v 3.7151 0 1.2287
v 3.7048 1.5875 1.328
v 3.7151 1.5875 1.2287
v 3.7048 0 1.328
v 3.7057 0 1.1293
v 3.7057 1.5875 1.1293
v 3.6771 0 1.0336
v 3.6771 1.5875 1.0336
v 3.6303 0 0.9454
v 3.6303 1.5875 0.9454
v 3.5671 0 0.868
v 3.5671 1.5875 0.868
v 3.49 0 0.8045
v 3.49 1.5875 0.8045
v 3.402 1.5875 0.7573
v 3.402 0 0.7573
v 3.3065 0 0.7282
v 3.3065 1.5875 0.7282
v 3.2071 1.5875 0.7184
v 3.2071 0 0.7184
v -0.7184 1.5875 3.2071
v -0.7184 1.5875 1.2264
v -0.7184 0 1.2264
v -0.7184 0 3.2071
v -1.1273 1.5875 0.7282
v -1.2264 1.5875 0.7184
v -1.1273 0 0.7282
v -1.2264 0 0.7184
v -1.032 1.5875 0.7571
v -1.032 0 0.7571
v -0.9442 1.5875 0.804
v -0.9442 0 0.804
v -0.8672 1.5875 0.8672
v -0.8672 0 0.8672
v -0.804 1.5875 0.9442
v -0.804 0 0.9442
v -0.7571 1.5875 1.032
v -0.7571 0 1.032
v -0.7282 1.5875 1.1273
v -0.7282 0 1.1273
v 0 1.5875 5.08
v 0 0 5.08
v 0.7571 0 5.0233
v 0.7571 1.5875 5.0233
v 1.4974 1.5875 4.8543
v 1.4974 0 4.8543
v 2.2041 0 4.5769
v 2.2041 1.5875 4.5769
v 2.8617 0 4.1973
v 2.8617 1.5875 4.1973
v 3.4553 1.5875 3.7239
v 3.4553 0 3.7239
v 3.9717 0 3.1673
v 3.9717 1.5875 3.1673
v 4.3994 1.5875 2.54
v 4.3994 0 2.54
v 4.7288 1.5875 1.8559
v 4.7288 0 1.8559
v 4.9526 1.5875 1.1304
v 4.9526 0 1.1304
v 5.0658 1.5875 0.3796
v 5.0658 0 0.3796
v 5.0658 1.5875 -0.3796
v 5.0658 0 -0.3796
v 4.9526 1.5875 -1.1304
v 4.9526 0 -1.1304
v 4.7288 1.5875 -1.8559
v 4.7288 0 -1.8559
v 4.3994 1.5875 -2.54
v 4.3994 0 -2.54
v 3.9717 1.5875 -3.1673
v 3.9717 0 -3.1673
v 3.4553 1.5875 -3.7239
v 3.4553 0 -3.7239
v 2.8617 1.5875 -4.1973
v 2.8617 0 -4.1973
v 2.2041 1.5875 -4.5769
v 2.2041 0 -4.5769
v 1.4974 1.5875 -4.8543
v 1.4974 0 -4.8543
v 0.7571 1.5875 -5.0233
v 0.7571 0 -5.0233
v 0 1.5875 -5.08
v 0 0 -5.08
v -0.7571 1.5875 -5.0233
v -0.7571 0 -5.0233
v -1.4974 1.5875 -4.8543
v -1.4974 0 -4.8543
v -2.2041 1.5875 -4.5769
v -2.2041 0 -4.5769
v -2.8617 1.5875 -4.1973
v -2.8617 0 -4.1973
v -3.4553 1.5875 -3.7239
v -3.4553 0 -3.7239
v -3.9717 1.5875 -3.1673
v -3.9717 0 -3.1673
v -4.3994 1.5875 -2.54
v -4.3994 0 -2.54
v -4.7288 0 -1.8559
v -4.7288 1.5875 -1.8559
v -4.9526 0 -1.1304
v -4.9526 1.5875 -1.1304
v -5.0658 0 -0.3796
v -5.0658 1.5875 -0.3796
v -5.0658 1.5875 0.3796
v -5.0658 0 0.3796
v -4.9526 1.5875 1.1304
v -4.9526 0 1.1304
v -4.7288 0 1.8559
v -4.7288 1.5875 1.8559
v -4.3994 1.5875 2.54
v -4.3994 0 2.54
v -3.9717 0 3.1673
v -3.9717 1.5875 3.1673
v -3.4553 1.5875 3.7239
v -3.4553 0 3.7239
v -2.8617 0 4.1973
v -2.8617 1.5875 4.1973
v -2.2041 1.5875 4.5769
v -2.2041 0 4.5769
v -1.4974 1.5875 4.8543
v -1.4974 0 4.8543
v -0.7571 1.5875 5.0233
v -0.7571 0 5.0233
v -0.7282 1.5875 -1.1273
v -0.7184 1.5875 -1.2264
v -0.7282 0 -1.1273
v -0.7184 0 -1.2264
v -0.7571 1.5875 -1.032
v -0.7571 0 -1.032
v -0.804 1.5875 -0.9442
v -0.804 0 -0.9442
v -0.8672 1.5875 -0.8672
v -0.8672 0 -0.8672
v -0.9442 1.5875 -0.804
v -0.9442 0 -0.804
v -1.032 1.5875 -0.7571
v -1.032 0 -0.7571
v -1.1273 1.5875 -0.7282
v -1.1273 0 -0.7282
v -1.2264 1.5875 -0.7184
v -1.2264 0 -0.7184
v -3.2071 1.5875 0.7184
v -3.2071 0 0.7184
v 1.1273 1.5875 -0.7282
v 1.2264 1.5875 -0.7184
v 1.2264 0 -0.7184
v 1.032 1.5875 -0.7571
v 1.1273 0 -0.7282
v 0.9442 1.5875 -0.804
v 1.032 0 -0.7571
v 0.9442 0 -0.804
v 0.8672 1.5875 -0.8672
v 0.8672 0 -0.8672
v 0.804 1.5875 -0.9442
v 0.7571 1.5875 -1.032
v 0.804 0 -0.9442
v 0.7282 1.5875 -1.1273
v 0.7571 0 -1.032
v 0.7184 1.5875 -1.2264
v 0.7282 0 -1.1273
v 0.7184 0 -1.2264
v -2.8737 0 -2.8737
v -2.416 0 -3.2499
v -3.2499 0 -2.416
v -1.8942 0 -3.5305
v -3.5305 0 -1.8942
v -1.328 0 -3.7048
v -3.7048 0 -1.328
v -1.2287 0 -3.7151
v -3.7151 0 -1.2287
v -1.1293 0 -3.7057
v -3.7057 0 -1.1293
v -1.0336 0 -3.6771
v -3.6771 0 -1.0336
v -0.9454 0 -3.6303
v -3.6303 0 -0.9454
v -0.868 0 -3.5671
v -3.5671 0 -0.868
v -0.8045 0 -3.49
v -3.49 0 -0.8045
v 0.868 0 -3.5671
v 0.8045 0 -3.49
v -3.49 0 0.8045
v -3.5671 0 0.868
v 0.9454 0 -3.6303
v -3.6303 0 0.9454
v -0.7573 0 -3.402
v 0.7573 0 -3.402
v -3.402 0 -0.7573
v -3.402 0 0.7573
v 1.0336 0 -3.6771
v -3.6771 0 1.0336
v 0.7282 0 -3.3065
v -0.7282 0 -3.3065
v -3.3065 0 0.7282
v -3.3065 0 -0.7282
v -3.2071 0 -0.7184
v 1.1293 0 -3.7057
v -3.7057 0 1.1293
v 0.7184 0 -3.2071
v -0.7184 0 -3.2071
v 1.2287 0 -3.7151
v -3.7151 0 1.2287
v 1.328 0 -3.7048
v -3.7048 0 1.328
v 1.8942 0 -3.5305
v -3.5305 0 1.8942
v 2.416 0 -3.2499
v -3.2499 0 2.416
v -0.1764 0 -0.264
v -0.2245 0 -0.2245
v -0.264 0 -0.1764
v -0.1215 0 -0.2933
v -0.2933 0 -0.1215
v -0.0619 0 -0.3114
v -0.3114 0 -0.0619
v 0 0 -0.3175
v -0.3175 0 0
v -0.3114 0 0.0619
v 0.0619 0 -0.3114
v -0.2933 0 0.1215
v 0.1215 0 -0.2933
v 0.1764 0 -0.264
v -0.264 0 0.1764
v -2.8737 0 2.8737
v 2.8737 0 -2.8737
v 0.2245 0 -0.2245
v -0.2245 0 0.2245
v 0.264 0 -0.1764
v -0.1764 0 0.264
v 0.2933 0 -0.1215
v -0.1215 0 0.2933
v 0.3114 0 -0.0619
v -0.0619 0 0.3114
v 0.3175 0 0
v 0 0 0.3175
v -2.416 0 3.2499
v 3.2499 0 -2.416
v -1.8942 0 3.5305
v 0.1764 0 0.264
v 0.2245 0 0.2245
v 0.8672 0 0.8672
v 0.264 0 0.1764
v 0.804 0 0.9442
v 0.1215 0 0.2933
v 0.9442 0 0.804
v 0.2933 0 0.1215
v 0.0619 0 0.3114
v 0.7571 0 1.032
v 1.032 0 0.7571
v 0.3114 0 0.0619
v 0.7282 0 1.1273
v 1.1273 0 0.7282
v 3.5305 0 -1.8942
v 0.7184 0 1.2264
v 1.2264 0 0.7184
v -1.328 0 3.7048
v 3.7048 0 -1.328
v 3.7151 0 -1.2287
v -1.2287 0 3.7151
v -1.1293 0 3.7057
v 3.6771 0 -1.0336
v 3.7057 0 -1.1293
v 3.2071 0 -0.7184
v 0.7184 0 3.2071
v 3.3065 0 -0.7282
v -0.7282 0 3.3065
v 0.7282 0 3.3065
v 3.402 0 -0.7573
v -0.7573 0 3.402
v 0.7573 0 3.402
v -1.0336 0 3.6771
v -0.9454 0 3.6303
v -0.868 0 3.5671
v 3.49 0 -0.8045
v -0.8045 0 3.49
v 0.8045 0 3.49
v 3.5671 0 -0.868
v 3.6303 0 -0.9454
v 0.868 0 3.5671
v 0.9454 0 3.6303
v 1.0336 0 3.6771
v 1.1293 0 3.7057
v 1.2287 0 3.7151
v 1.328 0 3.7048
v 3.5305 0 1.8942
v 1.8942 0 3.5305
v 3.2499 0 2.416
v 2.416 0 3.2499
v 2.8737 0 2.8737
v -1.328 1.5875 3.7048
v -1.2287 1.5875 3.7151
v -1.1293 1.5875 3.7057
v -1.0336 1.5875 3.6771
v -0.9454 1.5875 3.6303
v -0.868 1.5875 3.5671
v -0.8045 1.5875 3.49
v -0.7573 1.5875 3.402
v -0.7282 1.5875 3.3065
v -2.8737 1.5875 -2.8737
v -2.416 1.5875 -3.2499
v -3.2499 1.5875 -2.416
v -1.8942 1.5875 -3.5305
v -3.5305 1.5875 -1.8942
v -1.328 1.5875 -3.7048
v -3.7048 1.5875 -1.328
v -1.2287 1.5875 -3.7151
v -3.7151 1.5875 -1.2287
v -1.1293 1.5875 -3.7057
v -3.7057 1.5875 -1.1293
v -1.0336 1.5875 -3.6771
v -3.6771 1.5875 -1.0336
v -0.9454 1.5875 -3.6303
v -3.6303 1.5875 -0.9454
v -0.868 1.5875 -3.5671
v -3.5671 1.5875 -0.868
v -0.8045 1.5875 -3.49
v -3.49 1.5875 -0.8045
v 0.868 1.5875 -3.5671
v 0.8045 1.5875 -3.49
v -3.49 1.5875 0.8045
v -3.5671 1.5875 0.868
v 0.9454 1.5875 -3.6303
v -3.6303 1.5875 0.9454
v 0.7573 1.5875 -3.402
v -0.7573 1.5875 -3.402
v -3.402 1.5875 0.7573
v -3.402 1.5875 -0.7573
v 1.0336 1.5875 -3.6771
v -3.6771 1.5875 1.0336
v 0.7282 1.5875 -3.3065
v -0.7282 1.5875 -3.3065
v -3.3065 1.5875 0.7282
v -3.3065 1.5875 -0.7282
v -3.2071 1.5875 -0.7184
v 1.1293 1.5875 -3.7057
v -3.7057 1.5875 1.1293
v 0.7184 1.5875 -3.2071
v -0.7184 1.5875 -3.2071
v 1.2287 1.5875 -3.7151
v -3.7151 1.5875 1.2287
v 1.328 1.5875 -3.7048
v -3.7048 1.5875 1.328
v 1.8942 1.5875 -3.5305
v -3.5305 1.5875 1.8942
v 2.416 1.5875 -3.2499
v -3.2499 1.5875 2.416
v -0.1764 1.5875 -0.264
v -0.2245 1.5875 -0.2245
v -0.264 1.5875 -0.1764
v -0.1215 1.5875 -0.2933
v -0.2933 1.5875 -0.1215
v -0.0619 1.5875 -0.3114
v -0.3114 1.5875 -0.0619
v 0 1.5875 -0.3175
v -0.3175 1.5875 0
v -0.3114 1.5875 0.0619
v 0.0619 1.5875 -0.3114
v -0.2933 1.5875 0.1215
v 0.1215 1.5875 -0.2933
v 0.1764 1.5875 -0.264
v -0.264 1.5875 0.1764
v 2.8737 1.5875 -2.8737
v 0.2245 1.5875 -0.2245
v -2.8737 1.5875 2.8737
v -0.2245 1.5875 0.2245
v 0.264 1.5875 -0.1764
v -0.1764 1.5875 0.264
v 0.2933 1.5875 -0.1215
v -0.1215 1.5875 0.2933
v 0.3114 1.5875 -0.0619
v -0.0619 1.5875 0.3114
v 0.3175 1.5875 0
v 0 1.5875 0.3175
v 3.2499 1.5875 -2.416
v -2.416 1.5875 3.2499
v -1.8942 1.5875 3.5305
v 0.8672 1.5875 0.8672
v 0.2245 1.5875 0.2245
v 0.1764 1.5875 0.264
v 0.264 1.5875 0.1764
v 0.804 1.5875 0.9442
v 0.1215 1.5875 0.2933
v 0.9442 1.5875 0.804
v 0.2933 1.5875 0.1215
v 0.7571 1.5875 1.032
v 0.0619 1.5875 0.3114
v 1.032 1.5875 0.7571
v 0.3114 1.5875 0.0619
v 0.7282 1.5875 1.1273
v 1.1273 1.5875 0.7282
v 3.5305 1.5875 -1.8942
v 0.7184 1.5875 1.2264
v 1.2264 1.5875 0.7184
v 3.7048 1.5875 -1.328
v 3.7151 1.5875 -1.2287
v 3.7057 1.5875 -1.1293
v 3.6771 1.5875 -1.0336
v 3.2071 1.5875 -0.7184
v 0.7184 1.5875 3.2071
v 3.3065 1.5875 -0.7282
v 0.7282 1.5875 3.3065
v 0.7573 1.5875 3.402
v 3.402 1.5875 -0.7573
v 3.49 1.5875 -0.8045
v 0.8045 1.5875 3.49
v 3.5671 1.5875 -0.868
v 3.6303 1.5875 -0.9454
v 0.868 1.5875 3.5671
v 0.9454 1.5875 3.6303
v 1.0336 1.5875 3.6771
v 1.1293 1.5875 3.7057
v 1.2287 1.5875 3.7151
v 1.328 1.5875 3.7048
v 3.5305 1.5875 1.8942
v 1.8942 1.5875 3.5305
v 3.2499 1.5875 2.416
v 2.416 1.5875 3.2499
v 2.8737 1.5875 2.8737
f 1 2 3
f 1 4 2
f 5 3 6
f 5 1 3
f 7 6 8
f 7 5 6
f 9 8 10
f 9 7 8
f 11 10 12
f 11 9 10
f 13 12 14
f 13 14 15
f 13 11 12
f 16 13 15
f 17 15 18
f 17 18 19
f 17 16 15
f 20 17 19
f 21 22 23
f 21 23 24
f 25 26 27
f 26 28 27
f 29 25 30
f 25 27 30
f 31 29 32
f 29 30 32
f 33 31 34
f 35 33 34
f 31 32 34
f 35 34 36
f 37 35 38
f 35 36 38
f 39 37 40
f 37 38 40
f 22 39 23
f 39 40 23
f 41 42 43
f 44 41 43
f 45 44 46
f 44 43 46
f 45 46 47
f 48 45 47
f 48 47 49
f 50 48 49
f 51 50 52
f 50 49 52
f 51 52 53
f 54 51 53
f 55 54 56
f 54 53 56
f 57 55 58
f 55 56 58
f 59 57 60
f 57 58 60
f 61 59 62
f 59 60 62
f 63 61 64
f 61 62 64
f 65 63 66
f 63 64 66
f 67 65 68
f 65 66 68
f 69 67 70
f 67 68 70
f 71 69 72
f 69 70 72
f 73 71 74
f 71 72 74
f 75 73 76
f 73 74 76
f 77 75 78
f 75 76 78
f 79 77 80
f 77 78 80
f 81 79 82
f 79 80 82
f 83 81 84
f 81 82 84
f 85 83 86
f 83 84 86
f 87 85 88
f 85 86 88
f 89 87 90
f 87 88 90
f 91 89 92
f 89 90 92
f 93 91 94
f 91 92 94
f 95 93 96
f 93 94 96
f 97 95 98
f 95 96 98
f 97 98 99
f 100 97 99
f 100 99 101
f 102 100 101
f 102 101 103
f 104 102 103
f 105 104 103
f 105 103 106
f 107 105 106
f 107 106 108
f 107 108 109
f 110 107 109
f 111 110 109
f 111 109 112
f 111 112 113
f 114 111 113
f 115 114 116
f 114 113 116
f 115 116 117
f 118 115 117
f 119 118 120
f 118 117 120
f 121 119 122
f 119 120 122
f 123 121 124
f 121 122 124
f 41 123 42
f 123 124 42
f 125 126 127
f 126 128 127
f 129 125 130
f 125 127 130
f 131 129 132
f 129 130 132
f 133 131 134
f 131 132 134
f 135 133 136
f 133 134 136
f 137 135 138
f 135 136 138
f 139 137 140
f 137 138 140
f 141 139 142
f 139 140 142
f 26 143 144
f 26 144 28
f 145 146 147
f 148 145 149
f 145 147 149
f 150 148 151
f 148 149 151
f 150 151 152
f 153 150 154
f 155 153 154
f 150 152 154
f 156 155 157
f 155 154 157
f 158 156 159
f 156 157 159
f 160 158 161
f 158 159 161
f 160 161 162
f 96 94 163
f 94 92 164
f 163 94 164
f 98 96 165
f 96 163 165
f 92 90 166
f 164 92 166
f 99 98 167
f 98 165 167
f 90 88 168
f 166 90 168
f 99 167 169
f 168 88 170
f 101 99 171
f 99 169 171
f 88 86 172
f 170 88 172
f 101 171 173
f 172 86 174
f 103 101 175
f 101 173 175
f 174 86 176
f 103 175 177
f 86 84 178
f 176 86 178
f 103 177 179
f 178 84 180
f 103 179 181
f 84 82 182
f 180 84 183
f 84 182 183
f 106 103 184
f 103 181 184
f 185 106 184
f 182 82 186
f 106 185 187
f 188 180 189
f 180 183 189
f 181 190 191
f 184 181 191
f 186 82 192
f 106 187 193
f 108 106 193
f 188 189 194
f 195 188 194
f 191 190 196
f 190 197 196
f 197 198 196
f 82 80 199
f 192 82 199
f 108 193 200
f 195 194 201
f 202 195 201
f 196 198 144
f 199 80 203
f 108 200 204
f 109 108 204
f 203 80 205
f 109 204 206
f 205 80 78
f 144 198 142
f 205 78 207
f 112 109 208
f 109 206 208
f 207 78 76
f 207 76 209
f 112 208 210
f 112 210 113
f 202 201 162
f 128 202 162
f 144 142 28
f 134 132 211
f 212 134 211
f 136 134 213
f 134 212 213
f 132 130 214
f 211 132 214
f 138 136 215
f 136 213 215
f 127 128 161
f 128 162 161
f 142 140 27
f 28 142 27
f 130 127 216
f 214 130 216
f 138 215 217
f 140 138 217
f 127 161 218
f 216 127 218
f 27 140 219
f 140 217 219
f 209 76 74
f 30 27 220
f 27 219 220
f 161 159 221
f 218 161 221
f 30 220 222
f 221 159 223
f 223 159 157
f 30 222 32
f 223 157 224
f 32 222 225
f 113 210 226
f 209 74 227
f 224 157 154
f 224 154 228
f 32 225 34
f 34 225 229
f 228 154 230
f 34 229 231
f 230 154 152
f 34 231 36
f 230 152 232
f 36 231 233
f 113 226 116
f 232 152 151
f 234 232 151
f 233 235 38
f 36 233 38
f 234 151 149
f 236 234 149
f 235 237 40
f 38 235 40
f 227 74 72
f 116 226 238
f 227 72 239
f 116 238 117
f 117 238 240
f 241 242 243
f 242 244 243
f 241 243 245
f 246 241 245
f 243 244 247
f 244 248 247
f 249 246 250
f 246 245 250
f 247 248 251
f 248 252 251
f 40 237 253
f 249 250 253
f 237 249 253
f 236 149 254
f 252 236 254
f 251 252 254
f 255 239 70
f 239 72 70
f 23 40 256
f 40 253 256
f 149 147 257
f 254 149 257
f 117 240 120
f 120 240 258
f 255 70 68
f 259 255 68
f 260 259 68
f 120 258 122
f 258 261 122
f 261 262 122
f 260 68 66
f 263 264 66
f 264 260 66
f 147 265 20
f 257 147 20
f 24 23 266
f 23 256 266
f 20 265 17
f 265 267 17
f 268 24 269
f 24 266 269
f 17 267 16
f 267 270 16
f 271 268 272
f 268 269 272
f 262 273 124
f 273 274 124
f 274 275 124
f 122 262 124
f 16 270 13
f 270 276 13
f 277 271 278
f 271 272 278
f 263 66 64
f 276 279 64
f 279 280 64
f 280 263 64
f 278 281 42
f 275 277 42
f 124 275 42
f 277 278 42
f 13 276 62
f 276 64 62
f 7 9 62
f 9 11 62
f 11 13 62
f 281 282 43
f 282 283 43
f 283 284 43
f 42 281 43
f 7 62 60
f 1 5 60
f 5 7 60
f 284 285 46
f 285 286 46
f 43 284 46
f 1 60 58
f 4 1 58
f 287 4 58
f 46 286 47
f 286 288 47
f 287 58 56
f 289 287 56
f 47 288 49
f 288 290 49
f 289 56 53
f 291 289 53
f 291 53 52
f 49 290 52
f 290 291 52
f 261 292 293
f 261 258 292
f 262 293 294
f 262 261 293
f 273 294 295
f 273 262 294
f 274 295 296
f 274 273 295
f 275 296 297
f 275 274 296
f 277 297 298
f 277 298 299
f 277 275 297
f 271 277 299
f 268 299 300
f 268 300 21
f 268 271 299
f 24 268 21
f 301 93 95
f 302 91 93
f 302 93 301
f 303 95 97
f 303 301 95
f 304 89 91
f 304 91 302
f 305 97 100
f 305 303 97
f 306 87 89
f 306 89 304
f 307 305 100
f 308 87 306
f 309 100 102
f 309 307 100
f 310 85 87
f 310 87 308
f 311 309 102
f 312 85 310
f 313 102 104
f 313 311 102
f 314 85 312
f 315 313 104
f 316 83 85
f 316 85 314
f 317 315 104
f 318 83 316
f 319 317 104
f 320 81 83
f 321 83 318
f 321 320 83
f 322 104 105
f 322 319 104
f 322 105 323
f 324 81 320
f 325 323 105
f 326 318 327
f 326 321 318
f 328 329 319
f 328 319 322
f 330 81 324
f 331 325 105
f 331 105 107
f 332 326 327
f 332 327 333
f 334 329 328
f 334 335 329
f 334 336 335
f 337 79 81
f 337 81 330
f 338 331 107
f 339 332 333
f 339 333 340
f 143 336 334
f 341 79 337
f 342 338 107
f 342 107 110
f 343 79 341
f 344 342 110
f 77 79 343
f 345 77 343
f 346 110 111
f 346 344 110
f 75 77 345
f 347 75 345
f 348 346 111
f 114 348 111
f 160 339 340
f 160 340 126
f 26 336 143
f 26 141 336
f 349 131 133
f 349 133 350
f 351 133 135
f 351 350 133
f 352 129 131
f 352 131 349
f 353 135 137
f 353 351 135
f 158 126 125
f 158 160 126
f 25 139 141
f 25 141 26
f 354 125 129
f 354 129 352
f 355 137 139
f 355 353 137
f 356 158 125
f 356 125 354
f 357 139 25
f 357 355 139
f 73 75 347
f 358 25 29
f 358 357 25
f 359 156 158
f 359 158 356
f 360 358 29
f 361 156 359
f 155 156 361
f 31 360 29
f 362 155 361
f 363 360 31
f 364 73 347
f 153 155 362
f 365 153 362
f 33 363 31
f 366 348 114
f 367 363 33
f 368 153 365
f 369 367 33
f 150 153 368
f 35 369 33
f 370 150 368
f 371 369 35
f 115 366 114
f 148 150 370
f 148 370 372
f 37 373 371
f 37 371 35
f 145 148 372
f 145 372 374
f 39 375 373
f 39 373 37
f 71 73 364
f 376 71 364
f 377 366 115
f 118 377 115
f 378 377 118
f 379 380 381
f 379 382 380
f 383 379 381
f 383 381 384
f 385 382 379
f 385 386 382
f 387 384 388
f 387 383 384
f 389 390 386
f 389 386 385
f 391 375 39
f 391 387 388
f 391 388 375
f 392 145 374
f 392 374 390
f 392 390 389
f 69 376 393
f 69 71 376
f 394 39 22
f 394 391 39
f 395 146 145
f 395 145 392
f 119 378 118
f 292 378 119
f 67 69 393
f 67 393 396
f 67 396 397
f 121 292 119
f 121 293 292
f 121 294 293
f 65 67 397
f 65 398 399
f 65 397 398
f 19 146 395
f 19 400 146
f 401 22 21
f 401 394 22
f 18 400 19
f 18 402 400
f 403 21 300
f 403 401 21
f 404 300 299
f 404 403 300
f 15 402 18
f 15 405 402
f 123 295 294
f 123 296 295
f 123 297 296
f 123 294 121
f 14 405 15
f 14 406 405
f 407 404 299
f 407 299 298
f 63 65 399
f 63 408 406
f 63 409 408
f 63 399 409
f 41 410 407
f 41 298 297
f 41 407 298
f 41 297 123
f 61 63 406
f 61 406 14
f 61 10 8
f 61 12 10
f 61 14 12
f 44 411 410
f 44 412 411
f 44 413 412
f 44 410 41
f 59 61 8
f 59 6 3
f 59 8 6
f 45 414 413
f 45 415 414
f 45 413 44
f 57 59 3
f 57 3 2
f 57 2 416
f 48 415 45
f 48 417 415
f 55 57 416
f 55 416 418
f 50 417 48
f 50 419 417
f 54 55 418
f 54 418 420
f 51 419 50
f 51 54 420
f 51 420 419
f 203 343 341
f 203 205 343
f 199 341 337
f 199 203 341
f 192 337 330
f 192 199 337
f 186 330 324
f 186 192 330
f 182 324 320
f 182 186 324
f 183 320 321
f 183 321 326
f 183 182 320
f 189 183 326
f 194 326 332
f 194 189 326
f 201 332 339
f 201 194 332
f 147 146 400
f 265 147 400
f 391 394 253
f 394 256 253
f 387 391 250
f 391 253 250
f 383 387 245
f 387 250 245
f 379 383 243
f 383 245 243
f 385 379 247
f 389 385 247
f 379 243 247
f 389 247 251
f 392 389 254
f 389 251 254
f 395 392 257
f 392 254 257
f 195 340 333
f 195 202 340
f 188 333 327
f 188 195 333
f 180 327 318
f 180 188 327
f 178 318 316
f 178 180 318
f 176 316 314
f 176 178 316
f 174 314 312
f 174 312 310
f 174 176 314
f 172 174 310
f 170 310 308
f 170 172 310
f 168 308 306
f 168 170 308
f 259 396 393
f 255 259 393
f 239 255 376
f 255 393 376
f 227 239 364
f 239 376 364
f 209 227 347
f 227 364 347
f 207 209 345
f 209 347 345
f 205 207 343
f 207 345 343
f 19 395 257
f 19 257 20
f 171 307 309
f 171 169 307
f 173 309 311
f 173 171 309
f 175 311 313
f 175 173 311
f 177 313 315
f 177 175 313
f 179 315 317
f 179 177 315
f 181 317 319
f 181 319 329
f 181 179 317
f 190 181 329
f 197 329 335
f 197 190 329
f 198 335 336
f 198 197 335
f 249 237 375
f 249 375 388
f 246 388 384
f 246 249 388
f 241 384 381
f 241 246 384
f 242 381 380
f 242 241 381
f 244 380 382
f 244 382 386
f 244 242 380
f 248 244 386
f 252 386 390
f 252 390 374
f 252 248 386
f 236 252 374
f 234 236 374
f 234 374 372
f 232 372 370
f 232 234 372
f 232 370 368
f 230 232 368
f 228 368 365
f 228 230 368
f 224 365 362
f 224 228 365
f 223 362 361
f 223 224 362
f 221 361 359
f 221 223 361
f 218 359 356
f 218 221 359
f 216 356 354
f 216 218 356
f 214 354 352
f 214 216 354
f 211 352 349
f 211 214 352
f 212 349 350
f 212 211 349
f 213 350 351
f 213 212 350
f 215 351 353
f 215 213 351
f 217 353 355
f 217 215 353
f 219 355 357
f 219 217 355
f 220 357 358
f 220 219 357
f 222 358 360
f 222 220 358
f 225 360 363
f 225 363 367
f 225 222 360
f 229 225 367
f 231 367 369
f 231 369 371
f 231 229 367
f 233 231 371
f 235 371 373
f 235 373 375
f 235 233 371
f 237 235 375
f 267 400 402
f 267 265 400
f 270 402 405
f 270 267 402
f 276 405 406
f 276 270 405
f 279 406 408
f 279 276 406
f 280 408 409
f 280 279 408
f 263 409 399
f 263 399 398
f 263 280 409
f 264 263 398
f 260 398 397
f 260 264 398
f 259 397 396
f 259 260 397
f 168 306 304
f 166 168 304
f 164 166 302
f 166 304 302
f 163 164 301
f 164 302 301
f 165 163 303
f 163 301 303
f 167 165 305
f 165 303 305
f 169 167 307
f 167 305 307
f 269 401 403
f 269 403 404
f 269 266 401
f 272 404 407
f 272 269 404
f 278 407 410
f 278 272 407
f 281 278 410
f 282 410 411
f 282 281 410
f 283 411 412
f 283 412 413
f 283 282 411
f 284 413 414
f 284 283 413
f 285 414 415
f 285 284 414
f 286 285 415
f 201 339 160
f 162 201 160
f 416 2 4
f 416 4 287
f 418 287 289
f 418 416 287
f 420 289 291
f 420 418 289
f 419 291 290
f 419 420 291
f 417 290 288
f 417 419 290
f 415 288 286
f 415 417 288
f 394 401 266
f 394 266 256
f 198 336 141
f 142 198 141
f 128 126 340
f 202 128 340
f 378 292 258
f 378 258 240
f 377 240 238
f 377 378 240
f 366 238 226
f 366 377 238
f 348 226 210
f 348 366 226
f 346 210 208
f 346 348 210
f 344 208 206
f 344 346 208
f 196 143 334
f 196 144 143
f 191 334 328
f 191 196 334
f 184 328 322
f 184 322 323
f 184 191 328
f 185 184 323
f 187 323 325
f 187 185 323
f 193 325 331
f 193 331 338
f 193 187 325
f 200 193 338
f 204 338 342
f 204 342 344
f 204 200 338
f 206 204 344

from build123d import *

# Parameters (mm, degrees)
SKETCH1_R           = 5.08
SKETCH1_R_2         = 0.3175
BOSS_EXTRUDE1_DEPTH = 1.5875
CUT_EXTRUDE1_DEPTH  = 8.357510194
FILLET1_R           = 0.508
FILLET2_R           = 0.508


with BuildPart() as part:
    # Sketch1 → Boss-Extrude1 (new body)
    with BuildSketch(Plane(origin=(0, 0, 0), x_dir=(1, 0, 0), z_dir=(0, 1, 0))):
        with Locations(Location((0, 0, 0), (0, 0, 270))):
            Circle(SKETCH1_R)
        with Locations(Location((0, 0, 0), (0, 0, 270))):
            Circle(SKETCH1_R_2, mode=Mode.SUBTRACT)
    extrude(amount=BOSS_EXTRUDE1_DEPTH)

    # Sketch2 → Cut-Extrude1 (cut, through all)
    with BuildSketch(Plane(origin=(0, 1.5875, 0), x_dir=(1, 0, 0), z_dir=(0, 1, 0))):
        with BuildLine():
            Line((-0.71842049, 0.71842049), (-0.71842049, 3.76642049))
            ThreePointArc((-0.71842049, 3.76642049), (-2.873681959, 2.873681959), (-3.76642049, 0.71842049))
            Line((-3.76642049, 0.71842049), (-0.71842049, 0.71842049))
        make_face()
        with BuildLine():
            Line((0.71842049, 0.71842049), (3.76642049, 0.71842049))
            ThreePointArc((3.76642049, 0.71842049), (2.873681959, 2.873681959), (0.71842049, 3.76642049))
            Line((0.71842049, 3.76642049), (0.71842049, 0.71842049))
        make_face()
        with BuildLine():
            Line((0.71842049, -0.71842049), (3.76642049, -0.71842049))
            ThreePointArc((3.76642049, -0.71842049), (2.873681959, -2.873681959), (0.71842049, -3.76642049))
            Line((0.71842049, -3.76642049), (0.71842049, -0.71842049))
        make_face()
        with BuildLine():
            Line((-0.71842049, -0.71842049), (-0.71842049, -3.76642049))
            ThreePointArc((-0.71842049, -3.76642049), (-2.873681959, -2.873681959), (-3.76642049, -0.71842049))
            Line((-3.76642049, -0.71842049), (-0.71842049, -0.71842049))
        make_face()
    extrude(amount=-CUT_EXTRUDE1_DEPTH, mode=Mode.SUBTRACT)

    # Fillet1
    fillet1_edges = [part.edges().sort_by_distance(p)[0] for p in [
        (-0.71842049, 0.79375, -0.71842049),
        (0.71842049, 0.79375, -0.71842049),
        (0.71842049, 0.79375, 0.71842049),
        (-0.71842049, 0.79375, 0.71842049),
    ]]
    fillet(fillet1_edges, radius=FILLET1_R)

    # Fillet2
    fillet2_edges = [part.edges().sort_by_distance(p)[0] for p in [
        (-3.76642049, 0.79375, -0.71842049),
        (-0.71842049, 0.79375, -3.76642049),
        (0.71842049, 0.79375, -3.76642049),
        (3.76642049, 0.79375, -0.71842049),
        (0.71842049, 0.79375, 3.76642049),
        (3.76642049, 0.79375, 0.71842049),
        (-3.76642049, 0.79375, 0.71842049),
        (-0.71842049, 0.79375, 3.76642049),
    ]]
    fillet(fillet2_edges, radius=FILLET2_R)


solid = part.part
